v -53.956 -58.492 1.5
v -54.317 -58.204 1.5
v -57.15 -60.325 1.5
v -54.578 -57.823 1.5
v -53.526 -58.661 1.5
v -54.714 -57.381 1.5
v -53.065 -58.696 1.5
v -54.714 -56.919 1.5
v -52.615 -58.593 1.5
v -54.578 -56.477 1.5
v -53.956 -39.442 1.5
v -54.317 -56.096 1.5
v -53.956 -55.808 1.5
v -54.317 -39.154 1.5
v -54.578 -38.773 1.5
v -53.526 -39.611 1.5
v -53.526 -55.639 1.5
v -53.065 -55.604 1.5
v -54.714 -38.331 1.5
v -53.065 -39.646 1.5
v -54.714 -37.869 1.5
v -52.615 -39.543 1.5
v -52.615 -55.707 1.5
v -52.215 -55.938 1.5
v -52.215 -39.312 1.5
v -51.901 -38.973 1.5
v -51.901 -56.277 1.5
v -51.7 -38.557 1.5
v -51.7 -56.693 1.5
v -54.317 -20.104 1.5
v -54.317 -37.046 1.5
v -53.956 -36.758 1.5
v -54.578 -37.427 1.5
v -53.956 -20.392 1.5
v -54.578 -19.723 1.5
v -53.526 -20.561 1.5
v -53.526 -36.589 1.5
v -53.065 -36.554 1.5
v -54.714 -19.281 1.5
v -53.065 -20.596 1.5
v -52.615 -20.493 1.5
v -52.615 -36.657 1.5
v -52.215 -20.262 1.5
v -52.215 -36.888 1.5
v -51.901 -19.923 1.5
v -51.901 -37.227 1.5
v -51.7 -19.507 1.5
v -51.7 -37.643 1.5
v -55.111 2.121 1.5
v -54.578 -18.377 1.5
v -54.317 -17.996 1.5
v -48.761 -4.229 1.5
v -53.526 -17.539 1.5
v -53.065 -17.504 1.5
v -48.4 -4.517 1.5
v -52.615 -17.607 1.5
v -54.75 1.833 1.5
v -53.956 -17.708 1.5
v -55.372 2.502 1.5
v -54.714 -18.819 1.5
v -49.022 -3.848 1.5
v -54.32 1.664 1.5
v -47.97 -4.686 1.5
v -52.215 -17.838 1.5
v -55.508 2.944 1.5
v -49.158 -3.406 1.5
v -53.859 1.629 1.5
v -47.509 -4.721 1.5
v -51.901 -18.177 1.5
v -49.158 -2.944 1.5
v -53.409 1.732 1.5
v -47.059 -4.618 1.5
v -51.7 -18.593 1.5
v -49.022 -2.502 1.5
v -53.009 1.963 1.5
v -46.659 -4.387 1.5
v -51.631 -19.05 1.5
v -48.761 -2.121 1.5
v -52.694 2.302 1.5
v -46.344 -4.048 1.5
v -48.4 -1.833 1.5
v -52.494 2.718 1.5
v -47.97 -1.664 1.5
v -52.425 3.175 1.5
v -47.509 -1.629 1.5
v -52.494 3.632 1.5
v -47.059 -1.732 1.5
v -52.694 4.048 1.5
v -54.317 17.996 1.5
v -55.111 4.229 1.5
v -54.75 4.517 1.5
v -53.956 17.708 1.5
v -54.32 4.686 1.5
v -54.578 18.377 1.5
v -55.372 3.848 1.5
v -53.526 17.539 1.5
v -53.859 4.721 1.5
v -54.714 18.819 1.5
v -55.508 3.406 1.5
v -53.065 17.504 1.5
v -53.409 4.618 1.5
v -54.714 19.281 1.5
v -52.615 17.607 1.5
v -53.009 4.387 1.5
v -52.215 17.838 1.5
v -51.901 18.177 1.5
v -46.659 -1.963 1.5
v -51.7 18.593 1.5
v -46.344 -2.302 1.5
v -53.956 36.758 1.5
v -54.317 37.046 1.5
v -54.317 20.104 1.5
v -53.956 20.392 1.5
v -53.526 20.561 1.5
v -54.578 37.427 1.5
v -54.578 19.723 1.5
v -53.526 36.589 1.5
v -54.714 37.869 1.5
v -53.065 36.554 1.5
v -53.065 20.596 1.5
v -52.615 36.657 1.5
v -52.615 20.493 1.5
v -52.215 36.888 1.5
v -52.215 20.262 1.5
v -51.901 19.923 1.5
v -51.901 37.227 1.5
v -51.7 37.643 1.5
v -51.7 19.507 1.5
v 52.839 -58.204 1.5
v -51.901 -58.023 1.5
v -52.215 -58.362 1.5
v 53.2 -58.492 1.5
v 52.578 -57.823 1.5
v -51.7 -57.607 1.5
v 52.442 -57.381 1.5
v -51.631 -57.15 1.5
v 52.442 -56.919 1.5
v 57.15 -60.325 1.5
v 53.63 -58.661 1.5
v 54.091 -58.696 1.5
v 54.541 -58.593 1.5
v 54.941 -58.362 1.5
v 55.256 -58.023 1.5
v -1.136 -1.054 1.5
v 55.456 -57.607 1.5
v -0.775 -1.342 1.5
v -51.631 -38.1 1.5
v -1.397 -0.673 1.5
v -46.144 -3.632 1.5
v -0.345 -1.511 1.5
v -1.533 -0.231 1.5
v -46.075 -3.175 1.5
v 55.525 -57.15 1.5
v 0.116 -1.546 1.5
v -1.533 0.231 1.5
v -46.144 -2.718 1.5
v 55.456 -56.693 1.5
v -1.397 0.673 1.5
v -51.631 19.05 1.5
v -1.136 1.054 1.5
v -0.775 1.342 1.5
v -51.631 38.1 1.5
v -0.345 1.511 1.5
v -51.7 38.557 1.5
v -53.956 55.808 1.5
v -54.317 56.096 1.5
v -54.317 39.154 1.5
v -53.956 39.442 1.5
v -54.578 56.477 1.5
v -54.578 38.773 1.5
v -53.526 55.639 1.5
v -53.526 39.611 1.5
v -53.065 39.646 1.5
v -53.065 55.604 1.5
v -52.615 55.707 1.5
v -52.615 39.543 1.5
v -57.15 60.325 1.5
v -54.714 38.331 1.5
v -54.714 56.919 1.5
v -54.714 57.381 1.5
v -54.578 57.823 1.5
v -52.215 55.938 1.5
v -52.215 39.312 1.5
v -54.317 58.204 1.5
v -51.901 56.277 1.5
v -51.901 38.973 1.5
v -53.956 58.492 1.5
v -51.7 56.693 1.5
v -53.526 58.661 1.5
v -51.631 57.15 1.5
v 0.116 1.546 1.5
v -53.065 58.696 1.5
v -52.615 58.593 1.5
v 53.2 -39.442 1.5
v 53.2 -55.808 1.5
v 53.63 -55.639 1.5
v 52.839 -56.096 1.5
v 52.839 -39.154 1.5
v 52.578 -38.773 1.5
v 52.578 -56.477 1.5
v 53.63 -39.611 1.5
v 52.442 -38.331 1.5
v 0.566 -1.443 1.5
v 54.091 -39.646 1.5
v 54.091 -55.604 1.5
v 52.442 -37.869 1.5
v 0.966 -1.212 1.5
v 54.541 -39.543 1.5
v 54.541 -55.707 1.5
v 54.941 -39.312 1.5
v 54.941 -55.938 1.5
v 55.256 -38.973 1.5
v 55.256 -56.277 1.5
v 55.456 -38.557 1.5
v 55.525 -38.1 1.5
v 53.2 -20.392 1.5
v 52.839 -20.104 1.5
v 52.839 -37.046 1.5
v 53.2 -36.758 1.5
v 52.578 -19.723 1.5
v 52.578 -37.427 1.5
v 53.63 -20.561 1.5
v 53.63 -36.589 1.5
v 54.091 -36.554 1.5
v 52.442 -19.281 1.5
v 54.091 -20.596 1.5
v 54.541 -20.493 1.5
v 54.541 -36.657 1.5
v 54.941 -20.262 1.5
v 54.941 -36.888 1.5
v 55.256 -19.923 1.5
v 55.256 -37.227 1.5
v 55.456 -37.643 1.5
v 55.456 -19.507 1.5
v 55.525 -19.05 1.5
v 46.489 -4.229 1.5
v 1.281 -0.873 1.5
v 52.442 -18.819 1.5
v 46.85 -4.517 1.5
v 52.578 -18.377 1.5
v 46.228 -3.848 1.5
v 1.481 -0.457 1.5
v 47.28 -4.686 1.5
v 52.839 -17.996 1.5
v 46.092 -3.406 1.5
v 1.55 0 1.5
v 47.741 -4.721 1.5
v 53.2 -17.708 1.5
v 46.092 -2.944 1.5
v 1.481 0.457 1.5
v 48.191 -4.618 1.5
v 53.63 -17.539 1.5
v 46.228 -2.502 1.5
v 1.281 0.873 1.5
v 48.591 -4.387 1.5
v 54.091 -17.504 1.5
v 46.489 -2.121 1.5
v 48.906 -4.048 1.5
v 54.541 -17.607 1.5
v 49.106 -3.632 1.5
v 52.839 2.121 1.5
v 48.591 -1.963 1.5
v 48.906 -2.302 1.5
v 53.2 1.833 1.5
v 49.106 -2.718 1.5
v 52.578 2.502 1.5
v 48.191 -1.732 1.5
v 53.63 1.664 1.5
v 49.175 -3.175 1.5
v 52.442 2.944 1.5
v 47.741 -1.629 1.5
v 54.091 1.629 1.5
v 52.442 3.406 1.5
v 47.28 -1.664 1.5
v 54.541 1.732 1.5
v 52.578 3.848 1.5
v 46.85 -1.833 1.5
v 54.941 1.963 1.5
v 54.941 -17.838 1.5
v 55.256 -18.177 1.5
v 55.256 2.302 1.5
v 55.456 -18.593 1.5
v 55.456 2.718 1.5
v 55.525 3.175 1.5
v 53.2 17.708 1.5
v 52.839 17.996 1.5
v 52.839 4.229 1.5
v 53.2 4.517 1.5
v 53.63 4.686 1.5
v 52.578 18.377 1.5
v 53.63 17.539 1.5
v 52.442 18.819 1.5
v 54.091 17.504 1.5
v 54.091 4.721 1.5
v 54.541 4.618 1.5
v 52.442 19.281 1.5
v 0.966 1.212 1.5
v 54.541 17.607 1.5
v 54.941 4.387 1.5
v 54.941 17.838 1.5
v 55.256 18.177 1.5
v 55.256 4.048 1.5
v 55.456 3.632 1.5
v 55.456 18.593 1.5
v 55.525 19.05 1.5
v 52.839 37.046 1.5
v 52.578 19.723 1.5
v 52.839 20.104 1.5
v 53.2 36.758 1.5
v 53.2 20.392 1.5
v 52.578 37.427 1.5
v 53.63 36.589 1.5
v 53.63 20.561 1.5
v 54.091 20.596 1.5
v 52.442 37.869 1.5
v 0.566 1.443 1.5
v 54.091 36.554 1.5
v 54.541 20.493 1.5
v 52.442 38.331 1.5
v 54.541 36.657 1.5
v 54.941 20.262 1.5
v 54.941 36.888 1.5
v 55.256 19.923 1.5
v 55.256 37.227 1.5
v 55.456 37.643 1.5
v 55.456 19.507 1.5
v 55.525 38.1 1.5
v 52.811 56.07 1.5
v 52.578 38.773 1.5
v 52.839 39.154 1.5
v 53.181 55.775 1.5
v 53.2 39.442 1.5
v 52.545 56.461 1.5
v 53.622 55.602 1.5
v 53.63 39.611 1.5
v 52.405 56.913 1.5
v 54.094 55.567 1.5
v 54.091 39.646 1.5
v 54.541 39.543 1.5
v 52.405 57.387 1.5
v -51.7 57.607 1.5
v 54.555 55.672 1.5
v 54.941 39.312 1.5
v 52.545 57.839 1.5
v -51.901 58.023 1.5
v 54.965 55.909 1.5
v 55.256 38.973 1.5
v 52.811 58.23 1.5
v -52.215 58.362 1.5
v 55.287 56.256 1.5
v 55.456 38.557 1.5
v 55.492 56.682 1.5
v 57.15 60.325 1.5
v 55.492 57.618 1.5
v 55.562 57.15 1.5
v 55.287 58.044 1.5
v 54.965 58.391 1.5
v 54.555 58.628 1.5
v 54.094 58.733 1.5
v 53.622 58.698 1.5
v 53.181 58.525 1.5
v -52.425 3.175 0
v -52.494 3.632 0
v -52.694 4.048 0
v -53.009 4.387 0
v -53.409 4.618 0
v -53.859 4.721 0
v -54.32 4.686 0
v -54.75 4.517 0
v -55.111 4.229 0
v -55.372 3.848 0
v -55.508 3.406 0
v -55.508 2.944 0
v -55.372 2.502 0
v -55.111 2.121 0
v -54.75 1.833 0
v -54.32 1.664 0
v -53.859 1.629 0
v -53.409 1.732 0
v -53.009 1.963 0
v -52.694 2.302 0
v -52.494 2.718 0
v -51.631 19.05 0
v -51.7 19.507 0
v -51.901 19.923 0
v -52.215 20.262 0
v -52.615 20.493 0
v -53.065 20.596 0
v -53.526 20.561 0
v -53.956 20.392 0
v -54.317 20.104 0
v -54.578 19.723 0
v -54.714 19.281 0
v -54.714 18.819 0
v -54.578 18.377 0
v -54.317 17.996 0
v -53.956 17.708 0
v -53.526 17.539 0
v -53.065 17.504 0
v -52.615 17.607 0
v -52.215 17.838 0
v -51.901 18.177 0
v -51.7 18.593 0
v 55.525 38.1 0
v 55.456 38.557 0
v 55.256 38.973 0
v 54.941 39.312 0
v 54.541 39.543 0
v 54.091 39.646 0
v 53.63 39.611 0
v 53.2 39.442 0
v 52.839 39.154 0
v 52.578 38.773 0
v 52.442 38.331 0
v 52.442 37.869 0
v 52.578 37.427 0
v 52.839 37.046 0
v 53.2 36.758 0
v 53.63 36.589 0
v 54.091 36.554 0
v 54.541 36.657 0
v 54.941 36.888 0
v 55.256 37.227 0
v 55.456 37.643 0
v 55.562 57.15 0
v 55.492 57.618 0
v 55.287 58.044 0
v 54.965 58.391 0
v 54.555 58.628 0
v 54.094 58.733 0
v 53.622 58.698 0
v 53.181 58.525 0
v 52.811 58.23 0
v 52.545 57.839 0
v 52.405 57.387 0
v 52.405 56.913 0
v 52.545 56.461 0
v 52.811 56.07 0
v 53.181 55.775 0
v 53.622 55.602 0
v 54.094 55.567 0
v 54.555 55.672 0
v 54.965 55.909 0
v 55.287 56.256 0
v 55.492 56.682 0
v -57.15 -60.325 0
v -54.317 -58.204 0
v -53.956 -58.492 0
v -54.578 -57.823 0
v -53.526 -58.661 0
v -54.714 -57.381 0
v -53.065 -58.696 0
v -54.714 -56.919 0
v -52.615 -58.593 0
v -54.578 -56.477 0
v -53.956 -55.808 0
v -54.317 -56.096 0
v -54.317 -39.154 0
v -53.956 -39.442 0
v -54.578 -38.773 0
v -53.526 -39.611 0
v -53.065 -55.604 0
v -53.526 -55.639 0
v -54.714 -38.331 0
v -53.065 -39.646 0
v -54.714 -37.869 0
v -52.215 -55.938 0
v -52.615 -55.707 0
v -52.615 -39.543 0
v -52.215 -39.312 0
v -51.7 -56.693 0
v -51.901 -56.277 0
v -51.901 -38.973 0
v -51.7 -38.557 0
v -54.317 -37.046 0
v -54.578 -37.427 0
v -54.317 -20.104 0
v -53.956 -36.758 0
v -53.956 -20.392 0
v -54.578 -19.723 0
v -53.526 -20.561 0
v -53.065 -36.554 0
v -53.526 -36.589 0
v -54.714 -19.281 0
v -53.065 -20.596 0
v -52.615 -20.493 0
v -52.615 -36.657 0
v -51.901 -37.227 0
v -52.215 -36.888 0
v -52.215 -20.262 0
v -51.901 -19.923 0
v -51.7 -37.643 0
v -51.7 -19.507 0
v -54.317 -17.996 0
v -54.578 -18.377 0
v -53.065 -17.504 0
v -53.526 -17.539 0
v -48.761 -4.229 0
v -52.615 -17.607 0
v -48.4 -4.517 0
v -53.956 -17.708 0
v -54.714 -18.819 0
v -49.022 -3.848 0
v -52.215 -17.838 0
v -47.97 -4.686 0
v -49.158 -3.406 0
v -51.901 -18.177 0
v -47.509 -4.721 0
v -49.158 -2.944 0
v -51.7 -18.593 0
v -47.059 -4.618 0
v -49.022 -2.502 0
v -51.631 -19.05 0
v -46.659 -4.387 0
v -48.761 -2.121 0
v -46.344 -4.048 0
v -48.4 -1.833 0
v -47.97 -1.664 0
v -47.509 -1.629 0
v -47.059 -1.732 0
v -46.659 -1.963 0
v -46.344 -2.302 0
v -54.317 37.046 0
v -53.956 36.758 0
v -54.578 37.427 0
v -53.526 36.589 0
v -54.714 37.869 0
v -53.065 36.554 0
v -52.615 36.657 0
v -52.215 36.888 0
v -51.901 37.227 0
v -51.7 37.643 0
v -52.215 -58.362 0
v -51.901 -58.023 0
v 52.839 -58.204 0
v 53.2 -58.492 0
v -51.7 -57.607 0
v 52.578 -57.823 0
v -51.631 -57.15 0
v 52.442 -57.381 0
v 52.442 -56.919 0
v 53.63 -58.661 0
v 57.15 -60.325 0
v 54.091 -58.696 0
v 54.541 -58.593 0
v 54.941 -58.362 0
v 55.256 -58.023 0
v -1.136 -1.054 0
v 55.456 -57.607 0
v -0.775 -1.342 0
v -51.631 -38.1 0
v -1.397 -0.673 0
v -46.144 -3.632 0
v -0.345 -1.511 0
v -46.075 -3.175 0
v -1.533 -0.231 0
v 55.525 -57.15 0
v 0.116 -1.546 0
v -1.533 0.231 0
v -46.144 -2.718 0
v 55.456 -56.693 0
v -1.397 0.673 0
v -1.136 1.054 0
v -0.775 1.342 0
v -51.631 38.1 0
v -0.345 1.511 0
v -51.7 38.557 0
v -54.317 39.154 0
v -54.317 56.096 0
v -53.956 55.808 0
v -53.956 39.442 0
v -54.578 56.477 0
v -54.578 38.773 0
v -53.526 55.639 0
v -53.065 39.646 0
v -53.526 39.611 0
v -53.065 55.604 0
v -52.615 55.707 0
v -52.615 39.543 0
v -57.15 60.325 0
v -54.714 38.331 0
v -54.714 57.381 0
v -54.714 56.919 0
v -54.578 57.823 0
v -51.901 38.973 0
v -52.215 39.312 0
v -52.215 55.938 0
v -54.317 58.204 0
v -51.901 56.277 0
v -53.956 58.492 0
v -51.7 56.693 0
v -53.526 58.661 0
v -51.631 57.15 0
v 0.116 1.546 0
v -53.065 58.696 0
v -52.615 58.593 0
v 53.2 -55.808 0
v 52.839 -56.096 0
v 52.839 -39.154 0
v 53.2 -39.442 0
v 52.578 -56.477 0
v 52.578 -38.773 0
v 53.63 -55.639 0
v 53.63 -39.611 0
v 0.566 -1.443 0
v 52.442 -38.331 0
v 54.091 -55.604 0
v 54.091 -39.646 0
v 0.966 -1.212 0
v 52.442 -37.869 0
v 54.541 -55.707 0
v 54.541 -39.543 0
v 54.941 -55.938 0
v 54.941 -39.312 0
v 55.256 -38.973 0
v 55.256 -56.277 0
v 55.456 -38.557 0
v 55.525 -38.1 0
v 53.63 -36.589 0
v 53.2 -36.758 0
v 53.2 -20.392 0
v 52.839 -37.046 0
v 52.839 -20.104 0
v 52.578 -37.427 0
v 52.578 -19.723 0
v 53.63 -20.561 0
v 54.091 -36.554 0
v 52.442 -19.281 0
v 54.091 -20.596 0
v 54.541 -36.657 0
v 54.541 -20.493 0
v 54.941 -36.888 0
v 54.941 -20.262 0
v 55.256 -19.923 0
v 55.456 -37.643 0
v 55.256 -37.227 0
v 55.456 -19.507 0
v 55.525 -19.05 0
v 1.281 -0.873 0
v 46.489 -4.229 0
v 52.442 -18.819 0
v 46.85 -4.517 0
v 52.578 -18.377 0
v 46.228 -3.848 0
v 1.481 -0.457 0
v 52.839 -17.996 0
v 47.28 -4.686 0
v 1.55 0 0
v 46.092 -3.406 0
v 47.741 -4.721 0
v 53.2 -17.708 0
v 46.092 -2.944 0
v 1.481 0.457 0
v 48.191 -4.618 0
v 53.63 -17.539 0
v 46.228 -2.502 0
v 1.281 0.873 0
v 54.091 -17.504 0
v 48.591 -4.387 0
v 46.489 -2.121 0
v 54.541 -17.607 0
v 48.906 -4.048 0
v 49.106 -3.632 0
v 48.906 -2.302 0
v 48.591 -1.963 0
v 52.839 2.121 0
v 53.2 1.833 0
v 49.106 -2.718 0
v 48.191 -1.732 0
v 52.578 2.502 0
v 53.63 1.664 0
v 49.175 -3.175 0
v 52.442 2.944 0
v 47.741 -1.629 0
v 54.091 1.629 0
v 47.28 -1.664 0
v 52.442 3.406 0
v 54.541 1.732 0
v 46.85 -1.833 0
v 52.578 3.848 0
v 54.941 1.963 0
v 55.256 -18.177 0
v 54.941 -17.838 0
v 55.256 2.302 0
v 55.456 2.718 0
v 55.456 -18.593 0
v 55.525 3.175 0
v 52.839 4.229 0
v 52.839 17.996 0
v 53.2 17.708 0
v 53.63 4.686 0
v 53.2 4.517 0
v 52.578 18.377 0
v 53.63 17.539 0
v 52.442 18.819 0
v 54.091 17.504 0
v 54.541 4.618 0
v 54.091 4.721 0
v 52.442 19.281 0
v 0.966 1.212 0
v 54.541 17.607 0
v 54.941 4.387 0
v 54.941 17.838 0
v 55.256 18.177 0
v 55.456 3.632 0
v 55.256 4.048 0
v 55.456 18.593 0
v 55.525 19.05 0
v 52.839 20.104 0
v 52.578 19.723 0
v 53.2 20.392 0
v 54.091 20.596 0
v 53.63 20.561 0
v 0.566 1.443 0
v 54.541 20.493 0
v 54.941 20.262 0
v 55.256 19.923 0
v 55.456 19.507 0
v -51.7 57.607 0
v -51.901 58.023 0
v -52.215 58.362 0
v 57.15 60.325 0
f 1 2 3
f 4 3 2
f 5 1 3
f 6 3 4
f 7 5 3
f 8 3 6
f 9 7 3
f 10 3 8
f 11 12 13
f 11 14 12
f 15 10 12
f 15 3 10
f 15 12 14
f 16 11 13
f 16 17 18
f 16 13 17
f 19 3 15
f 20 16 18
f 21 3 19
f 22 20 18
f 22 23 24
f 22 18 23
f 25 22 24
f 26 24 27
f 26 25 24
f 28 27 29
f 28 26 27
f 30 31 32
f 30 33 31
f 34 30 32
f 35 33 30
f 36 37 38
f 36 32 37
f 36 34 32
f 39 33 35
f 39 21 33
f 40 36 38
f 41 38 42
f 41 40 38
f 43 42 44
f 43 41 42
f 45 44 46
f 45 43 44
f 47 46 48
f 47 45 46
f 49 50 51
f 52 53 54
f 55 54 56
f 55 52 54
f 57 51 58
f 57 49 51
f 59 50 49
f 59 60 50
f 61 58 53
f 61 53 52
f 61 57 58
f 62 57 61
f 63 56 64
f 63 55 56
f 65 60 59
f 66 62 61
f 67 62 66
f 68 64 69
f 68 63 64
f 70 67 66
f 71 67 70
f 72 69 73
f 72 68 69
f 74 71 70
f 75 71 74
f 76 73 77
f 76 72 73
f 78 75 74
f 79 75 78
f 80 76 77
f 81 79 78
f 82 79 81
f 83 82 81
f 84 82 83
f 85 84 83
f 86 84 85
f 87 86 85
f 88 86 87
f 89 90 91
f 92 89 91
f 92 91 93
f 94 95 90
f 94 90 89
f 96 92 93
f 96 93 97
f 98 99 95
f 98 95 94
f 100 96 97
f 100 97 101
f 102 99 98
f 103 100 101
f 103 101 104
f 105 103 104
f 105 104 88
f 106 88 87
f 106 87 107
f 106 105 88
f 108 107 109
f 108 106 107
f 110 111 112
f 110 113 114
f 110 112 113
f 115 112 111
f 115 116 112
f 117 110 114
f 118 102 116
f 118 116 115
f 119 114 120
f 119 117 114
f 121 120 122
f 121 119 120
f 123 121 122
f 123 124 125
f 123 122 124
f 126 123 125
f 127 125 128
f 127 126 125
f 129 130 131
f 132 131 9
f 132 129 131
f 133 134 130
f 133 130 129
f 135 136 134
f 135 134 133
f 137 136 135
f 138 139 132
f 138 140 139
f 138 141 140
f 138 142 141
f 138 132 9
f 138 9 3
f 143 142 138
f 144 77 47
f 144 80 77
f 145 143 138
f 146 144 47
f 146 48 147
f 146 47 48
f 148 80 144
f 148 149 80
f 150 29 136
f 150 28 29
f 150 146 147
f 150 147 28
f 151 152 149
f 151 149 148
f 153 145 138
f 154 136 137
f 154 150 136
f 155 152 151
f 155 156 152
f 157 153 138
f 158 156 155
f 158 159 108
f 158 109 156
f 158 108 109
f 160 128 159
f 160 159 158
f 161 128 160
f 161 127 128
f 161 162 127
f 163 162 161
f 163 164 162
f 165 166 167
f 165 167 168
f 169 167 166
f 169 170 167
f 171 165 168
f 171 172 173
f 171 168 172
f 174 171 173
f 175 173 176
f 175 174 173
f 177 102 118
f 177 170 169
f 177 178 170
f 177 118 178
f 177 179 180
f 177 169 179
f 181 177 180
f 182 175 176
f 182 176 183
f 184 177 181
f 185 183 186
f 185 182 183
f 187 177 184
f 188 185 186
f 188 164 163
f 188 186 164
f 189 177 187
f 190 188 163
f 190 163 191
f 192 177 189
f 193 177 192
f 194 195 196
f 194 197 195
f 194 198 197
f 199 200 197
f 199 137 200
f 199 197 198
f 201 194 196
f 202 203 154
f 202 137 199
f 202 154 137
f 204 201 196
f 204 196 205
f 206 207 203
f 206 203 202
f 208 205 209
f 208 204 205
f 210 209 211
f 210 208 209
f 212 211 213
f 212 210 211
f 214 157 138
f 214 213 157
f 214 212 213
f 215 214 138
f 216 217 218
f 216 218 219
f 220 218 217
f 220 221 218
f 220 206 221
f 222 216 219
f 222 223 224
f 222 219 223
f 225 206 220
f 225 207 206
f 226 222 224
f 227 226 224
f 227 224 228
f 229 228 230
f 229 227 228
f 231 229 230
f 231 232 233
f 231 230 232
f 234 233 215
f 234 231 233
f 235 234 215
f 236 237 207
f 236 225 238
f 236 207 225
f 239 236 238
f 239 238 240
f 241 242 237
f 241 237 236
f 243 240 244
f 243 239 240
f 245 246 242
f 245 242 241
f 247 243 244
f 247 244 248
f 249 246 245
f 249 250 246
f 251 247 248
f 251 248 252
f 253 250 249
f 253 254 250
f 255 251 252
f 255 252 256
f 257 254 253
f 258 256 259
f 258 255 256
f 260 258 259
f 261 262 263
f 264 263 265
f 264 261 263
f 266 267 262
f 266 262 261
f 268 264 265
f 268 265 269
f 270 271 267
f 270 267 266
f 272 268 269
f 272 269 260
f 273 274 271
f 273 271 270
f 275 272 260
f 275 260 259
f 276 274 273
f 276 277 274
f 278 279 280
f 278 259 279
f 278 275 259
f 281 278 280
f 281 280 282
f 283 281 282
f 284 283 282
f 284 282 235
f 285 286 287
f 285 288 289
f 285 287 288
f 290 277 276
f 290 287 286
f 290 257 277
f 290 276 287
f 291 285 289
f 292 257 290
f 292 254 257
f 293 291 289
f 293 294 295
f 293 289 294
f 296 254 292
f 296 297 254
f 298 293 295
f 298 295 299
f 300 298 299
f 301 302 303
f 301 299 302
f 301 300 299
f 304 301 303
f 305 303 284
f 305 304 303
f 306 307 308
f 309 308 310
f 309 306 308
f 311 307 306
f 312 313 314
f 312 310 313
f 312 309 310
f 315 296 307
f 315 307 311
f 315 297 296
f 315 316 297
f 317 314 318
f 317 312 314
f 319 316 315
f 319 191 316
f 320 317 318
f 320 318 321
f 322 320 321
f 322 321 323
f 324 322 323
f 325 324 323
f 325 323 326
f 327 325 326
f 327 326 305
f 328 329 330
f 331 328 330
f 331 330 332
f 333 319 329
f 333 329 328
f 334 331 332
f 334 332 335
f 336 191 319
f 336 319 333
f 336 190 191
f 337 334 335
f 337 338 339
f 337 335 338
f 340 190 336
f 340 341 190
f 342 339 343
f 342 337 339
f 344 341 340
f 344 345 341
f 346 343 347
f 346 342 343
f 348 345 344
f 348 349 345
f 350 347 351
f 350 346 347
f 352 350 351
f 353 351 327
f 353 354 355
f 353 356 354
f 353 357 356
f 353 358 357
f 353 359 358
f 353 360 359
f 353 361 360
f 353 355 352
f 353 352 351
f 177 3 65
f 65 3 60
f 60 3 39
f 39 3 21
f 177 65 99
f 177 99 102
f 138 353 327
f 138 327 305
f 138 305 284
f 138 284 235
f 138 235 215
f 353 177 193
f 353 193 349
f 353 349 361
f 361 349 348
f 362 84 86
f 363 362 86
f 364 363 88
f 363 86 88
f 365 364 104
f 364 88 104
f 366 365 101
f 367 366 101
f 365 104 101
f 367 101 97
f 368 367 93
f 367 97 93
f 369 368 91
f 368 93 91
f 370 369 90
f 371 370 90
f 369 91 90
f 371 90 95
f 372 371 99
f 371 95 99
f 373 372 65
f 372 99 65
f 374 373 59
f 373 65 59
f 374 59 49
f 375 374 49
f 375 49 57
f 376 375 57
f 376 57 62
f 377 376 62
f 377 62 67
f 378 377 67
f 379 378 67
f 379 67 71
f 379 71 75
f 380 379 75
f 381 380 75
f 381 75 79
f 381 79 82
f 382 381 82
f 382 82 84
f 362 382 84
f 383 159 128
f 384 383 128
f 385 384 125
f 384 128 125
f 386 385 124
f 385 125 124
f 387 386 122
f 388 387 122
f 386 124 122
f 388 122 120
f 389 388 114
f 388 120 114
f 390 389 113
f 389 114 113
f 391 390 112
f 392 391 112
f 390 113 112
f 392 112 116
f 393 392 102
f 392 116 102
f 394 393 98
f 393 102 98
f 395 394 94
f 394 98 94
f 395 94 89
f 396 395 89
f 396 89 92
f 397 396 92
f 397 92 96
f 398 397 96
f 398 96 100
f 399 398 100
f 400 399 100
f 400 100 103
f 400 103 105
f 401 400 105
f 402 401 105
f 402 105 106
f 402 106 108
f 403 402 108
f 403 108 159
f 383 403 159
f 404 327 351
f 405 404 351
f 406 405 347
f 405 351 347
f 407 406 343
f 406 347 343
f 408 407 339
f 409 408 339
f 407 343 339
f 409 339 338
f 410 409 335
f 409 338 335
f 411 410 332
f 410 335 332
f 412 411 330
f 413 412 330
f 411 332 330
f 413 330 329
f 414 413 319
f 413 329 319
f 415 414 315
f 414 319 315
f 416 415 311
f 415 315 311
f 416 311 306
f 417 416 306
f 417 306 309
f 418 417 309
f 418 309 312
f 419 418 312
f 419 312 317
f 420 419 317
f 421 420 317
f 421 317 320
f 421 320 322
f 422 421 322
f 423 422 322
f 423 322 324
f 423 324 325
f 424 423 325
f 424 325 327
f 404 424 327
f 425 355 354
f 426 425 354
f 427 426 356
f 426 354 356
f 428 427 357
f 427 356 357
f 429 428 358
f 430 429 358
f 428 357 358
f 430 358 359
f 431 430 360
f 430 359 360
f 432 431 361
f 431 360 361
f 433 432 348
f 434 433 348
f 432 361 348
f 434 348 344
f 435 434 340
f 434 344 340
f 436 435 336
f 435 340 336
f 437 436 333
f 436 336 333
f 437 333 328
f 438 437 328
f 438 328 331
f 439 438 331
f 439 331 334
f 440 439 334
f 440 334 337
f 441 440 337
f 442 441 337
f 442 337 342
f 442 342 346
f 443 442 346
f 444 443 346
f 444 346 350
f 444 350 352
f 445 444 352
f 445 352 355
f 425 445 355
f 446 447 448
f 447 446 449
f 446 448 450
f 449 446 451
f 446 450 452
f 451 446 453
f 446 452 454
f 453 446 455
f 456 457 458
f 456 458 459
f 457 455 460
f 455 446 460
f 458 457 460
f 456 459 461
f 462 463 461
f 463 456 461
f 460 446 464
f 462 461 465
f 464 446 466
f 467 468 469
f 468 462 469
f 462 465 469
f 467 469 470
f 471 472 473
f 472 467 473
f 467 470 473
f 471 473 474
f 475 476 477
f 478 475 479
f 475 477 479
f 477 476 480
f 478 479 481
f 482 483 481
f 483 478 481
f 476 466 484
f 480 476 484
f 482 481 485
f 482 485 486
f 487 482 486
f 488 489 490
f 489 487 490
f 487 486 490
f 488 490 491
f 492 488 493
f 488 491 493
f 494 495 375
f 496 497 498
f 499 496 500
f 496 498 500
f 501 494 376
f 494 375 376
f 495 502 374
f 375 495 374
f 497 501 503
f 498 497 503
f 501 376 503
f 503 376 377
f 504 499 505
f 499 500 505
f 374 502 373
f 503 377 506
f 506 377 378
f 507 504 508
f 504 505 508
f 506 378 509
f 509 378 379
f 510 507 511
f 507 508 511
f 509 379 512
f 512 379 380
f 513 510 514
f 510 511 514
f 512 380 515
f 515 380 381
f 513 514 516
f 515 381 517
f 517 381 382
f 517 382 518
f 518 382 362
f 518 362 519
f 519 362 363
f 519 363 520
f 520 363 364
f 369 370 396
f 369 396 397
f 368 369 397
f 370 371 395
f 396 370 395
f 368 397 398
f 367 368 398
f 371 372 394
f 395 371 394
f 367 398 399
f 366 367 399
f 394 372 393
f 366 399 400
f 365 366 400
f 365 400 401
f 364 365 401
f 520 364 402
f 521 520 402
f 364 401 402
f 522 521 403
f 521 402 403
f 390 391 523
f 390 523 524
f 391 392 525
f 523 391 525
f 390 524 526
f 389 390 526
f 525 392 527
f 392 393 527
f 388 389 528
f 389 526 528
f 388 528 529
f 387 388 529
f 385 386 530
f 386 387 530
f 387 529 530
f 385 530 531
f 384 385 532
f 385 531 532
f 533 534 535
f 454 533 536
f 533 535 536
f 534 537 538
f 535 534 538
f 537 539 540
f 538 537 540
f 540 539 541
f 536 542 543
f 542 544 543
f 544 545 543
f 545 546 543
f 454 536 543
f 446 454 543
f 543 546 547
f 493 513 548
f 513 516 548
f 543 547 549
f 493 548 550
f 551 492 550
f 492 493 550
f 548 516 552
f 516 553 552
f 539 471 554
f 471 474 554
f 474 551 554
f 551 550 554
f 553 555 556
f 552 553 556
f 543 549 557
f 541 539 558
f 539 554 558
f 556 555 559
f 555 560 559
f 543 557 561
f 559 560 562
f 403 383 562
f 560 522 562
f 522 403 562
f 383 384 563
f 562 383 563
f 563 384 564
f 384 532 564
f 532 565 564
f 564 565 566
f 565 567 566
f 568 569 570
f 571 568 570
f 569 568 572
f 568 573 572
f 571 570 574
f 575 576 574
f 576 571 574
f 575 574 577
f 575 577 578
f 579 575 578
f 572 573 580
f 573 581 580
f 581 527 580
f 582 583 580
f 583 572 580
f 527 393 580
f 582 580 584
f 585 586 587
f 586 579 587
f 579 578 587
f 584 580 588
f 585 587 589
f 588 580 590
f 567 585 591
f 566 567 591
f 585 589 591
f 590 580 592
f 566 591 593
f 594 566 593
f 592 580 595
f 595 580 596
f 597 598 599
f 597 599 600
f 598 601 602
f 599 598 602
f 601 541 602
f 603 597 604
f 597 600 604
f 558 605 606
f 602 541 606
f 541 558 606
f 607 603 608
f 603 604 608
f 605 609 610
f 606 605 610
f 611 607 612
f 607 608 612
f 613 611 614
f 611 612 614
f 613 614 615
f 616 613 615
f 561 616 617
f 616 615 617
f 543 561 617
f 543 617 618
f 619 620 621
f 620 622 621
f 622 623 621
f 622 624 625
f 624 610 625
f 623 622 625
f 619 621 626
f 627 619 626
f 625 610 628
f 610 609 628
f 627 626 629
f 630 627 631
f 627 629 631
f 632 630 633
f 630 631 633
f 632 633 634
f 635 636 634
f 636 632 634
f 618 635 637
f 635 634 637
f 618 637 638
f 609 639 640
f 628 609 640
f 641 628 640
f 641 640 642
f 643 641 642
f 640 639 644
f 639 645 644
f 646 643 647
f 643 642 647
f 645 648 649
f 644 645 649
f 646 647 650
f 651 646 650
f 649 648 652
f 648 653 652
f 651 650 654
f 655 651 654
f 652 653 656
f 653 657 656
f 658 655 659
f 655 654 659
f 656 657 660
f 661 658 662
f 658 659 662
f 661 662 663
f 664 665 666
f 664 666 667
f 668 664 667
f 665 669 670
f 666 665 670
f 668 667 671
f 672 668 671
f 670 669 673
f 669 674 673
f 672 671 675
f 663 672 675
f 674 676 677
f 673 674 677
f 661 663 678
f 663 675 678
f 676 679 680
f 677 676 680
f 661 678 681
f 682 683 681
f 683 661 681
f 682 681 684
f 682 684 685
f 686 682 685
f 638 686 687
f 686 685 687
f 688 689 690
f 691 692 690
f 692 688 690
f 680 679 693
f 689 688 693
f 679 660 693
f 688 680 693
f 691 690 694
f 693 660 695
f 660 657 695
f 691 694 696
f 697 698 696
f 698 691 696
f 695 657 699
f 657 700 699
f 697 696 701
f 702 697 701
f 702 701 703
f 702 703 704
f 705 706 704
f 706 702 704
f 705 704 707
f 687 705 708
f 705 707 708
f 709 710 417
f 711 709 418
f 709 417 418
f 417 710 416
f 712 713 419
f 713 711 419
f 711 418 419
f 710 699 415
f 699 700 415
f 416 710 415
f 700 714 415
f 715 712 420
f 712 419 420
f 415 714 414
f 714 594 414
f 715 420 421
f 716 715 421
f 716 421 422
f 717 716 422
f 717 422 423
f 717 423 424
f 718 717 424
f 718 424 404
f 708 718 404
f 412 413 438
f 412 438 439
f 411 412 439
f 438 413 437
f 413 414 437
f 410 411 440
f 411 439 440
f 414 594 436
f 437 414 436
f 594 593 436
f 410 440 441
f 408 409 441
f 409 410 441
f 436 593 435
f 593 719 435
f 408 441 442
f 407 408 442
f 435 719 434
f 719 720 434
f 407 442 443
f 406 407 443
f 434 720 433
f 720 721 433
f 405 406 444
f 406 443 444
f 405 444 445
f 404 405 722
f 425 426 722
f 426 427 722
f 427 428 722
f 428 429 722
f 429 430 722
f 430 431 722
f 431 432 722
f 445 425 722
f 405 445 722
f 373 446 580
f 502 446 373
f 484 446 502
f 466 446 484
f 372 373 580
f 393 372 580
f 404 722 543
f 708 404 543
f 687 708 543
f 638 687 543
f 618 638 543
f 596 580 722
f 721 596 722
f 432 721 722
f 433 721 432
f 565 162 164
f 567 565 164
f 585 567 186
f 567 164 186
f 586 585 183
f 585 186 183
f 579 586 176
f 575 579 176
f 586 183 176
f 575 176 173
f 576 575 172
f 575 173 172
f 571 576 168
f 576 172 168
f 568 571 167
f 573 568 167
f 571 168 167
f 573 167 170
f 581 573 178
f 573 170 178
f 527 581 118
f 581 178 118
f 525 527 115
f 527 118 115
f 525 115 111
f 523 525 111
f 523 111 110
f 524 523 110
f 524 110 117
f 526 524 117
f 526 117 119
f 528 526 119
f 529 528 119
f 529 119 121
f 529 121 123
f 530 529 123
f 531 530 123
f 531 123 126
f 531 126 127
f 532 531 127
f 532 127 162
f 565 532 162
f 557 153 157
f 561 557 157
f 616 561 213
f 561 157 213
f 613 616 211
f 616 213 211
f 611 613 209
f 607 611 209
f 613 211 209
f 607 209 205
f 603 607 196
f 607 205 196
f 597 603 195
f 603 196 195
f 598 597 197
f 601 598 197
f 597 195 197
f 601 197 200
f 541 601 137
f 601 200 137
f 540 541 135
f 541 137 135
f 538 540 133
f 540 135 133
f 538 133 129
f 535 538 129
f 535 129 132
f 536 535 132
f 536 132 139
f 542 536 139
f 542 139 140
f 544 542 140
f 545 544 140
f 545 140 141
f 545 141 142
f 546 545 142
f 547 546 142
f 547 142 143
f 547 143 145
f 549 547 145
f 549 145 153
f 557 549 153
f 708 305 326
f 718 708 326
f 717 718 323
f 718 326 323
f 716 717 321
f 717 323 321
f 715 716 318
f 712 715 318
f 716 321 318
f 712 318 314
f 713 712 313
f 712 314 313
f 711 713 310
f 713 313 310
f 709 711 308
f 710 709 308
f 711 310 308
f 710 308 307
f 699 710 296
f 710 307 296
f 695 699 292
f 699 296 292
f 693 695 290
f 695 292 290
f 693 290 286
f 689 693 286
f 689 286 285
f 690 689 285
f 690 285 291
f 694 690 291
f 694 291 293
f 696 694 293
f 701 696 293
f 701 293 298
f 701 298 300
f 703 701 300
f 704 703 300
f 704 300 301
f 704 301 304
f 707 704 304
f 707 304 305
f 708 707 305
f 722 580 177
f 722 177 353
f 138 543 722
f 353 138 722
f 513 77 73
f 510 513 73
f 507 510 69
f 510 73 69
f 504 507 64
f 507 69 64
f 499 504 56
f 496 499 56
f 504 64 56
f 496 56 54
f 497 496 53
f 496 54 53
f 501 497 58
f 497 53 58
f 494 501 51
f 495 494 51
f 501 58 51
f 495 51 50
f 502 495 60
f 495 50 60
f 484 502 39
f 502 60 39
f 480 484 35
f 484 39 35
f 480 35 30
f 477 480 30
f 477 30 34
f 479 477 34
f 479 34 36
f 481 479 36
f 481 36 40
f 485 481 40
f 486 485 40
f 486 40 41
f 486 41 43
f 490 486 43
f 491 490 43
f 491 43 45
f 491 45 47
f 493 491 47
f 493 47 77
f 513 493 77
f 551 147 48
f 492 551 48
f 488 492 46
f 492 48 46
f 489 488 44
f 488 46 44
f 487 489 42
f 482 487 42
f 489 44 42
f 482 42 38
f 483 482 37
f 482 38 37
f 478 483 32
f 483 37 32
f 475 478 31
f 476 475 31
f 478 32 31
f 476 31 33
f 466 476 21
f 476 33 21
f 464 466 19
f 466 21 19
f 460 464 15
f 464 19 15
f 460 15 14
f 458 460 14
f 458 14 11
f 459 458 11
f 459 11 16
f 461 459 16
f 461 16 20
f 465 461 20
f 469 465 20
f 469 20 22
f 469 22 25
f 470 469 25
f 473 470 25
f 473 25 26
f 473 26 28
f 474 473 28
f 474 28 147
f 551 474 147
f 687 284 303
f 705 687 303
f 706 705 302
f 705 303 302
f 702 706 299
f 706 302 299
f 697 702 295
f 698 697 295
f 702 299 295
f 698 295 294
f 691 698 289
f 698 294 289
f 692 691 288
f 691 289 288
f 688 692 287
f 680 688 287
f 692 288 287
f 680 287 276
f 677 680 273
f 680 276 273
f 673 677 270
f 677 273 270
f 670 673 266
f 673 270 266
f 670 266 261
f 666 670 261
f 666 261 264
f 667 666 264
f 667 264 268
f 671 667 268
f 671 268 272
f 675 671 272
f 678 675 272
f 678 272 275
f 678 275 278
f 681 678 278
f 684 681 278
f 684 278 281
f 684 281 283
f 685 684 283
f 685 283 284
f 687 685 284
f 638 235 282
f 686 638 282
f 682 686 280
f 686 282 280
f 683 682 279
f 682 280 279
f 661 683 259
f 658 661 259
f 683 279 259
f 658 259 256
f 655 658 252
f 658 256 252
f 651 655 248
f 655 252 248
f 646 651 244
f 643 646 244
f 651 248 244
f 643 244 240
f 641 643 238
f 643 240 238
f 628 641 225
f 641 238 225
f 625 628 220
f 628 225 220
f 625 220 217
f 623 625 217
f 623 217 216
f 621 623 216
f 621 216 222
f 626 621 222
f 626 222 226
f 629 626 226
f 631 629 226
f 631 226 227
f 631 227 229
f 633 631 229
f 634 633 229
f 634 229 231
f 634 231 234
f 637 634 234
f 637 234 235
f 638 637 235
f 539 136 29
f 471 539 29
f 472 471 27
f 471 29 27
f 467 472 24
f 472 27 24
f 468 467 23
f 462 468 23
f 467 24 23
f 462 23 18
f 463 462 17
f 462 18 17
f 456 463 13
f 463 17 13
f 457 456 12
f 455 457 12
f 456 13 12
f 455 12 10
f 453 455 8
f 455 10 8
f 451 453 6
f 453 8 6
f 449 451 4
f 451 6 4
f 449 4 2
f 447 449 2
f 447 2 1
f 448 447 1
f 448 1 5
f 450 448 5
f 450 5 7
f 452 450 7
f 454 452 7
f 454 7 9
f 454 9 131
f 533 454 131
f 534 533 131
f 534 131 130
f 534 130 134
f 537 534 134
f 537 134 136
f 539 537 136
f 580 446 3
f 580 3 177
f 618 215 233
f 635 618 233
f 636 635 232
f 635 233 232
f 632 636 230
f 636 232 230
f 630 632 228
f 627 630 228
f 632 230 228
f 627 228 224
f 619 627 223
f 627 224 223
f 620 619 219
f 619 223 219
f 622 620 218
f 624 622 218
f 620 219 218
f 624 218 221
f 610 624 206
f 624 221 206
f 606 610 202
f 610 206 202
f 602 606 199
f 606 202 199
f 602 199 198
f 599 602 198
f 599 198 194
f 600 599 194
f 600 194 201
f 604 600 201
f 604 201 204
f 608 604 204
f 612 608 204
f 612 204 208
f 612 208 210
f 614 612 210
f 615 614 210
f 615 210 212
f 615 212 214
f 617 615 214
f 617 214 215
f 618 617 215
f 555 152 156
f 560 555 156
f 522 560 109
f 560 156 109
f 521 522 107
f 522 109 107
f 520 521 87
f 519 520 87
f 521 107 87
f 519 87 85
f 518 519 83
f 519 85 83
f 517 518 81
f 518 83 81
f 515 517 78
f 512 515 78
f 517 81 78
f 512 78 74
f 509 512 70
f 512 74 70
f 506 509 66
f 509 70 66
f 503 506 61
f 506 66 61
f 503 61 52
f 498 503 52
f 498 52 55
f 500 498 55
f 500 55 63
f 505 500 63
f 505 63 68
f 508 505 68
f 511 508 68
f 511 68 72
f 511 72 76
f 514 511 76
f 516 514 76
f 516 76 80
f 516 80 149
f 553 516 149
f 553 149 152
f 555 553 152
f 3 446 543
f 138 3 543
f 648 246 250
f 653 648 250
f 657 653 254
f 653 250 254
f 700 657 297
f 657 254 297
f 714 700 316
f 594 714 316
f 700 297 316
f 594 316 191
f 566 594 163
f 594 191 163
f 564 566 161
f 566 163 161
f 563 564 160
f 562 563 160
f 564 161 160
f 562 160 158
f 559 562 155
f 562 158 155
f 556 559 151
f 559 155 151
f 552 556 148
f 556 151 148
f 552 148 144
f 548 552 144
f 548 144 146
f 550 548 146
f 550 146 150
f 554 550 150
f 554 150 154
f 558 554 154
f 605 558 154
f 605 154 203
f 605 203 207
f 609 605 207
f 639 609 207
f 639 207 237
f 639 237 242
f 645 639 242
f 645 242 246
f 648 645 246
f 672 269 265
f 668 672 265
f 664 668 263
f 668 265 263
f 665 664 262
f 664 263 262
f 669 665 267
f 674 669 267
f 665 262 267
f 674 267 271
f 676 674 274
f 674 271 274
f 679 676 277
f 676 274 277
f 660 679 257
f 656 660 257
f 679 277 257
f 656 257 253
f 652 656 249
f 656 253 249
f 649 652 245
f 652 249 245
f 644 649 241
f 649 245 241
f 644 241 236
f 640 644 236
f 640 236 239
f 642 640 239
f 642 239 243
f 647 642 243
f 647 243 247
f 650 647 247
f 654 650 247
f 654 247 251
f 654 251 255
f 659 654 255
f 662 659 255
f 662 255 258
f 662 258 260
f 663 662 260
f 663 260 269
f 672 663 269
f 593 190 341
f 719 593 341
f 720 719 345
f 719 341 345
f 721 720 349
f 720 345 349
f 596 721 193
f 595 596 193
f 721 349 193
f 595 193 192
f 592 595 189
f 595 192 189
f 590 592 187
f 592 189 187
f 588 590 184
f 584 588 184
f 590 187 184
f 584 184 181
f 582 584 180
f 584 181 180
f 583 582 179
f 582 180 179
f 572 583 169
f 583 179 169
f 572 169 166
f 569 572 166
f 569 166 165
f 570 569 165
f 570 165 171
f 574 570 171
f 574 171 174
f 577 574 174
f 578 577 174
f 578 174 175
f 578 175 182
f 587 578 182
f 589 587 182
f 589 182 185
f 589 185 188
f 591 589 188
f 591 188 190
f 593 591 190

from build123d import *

# Parameters (mm, degrees)
SKETCH1_W          = 114.3
SKETCH1_H          = 120.65
EXTRUDE1_DEPTH     = 1.5
SKETCH2_R          = 1.55
SKETCH2_R_2        = 1.5875
CUT_EXTRUDE1_DEPTH = 84.111239463


with BuildPart() as part:
    # Sketch1 → Extrude1 (new body)
    with BuildSketch(Plane.XY):
        Rectangle(SKETCH1_W, SKETCH1_H)
    extrude(amount=EXTRUDE1_DEPTH)

    # Sketch2 → Cut-Extrude1 (cut, through all)
    with BuildSketch(Plane.XY.offset(1.5)):
        with Locations((-53.975, 3.175)):
            Circle(SKETCH2_R)
        with Locations((-47.625, -3.175)):
            Circle(SKETCH2_R)
        with Locations((53.975, 3.175)):
            Circle(SKETCH2_R)
        with Locations((47.625, -3.175)):
            Circle(SKETCH2_R)
        Circle(SKETCH2_R)
        with Locations((-53.18125, 57.15)):
            Circle(SKETCH2_R)
        with Locations((-53.18125, -19.05)):
            Circle(SKETCH2_R)
        with Locations((-53.18125, 38.1)):
            Circle(SKETCH2_R)
        with Locations((-53.18125, 19.05)):
            Circle(SKETCH2_R)
        with Locations((-53.18125, -38.1)):
            Circle(SKETCH2_R)
        with Locations((-53.18125, -57.15)):
            Circle(SKETCH2_R)
        with Locations((53.975, 57.15)):
            Circle(SKETCH2_R_2)
        with Locations((53.975, 38.1)):
            Circle(SKETCH2_R)
        with Locations((53.975, 19.05)):
            Circle(SKETCH2_R)
        with Locations((53.975, -19.05)):
            Circle(SKETCH2_R)
        with Locations((53.975, -38.1)):
            Circle(SKETCH2_R)
        with Locations((53.975, -57.15)):
            Circle(SKETCH2_R)
    extrude(amount=-CUT_EXTRUDE1_DEPTH, mode=Mode.SUBTRACT)


solid = part.part
